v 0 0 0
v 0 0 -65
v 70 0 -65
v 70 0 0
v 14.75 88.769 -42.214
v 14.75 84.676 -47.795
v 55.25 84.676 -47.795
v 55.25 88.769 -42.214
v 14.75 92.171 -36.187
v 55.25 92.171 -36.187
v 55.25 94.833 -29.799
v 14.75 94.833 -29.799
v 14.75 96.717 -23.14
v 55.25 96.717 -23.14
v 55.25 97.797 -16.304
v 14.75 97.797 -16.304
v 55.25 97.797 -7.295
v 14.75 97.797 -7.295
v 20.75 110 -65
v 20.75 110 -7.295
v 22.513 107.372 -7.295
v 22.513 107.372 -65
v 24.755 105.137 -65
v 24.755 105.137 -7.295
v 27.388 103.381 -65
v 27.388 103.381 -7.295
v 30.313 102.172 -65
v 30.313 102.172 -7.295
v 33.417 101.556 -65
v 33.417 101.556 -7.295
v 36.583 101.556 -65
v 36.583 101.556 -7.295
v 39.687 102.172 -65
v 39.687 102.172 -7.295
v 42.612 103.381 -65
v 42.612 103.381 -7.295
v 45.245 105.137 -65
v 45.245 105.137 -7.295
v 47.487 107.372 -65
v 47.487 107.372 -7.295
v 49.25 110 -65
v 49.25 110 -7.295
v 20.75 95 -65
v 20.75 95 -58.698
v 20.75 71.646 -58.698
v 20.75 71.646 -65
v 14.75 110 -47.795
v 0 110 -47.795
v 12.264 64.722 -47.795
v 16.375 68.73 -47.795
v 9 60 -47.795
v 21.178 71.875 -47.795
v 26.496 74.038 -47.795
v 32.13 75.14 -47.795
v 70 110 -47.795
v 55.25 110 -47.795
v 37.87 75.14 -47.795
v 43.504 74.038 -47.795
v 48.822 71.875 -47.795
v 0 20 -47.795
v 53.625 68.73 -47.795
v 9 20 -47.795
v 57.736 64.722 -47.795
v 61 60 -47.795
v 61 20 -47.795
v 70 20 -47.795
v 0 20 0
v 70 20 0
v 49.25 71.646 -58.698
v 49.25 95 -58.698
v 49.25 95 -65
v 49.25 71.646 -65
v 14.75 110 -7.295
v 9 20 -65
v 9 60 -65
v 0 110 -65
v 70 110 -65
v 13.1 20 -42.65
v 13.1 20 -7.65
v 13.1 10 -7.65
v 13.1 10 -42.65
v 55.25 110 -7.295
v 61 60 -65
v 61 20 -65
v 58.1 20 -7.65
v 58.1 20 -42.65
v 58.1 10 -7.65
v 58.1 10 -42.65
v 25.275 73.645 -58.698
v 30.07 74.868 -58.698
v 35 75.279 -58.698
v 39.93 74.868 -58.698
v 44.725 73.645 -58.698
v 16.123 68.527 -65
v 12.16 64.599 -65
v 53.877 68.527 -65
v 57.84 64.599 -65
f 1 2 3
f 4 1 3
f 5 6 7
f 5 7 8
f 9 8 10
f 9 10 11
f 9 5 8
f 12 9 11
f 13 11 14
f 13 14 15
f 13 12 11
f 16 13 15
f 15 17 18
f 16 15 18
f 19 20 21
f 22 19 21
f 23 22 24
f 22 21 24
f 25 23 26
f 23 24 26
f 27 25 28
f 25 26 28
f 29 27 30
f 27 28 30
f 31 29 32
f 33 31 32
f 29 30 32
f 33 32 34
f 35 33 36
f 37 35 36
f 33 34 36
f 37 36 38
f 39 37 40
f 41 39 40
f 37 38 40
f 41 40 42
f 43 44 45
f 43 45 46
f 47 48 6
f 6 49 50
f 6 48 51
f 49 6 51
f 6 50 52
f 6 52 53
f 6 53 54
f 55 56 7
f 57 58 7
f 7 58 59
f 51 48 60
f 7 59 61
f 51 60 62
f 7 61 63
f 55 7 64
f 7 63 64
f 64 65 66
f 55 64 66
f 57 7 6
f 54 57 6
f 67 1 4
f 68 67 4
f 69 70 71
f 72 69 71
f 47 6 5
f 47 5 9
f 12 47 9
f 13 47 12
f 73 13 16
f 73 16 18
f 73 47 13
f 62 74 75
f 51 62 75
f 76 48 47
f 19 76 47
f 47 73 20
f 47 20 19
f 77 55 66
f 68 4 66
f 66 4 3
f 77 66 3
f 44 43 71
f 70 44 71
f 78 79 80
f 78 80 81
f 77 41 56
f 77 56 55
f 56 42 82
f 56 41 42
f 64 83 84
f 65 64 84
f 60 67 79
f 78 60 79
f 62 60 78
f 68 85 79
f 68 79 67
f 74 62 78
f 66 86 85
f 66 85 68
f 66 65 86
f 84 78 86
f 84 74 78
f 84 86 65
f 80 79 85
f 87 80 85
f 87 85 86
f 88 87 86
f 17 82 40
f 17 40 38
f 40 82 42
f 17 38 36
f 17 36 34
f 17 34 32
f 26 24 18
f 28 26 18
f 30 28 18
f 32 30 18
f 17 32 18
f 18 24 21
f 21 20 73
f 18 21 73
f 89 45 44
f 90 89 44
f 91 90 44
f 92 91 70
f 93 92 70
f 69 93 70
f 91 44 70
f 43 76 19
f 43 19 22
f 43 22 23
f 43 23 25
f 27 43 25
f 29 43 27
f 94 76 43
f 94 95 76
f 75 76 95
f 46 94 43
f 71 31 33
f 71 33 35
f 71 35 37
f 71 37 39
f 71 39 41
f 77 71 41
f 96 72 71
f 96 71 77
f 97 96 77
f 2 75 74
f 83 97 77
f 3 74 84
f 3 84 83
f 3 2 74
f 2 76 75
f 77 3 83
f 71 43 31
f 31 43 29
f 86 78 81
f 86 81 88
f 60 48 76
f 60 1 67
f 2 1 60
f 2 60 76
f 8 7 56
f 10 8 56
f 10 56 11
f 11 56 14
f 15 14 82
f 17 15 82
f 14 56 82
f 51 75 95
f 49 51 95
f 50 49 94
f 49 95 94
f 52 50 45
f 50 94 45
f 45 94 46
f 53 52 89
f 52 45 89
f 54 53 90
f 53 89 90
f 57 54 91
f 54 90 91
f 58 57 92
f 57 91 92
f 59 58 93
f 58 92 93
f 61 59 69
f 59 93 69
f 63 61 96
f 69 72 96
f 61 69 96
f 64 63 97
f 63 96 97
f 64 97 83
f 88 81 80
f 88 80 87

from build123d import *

# Parameters (mm, degrees)
SKETCH1_W               = 70
SKETCH1_H               = 65
BOSS_EXTRUDE1_DEPTH     = 20
SKETCH2_W               = 45
SKETCH2_H               = 35
CUT_EXTRUDE1_DEPTH      = 10
SKETCH3_W               = 70
SKETCH3_H               = 17.205499322
BOSS_EXTRUDE2_DEPTH     = 75
CUT_EXTRUDE2_REACH      = 136.722
CUT_EXTRUDE3_REACH      = 136.722
CUT_EXTRUDE3_END_RADIUS = 29.761393769
SKETCH7_W               = 28.5
SKETCH7_H               = 6.302488938
SKETCH8_W               = 70
SKETCH8_H               = 17.205499322
BOSS_EXTRUDE3_DEPTH     = 15
CUT_EXTRUDE4_DEPTH      = 146.688022843
CUT_EXTRUDE4_DEPTH_BACK = 146.688022843
BOSS_EXTRUDE8_START     = 40.5
BOSS_EXTRUDE8_DEPTH     = 40.5
BOSS_EXTRUDE10_DEPTH    = 40.5


with BuildPart() as part:
    # Sketch1 → Boss-Extrude1 (new body)
    with BuildSketch(Plane(origin=(0, 0, 0), x_dir=(1, 0, 0), z_dir=(0, 1, 0))):
        with Locations((35, 32.5)):
            Rectangle(SKETCH1_W, SKETCH1_H)
    extrude(amount=BOSS_EXTRUDE1_DEPTH)

    # Sketch2 → Cut-Extrude1 (cut)
    with BuildSketch(Plane(origin=(0, 20, 0), x_dir=(1, 0, 0), z_dir=(0, 1, 0))):
        with Locations((35.6, 25.150369075)):
            Rectangle(SKETCH2_W, SKETCH2_H)
    extrude(amount=-CUT_EXTRUDE1_DEPTH, mode=Mode.SUBTRACT)

    # Sketch3 → Boss-Extrude2 (add)
    with BuildSketch(Plane(origin=(0, 20, 0), x_dir=(1, 0, 0), z_dir=(0, 1, 0))):
        with Locations((35, 56.397250339)):
            Rectangle(SKETCH3_W, SKETCH3_H)
    extrude(amount=BOSS_EXTRUDE2_DEPTH)

    # Sketch6 → Cut-Extrude2 (cut, up to next)
    with BuildSketch(Plane(origin=(0, 0, -65), x_dir=(-1, 0, 0), z_dir=(0, 0, -1)), mode=Mode.PRIVATE) as cut_extrude2_sk1:
        with BuildLine():
            Line((-61, 60), (-61, 20))
            Line((-61, 20), (-9, 20))
            Line((-9, 20), (-9, 60))
            ThreePointArc((-9, 60), (-35, 75.278971352), (-61, 60))
        make_face()
    cut_extrude2_tool1 = extrude(cut_extrude2_sk1.sketch, amount=-CUT_EXTRUDE2_REACH, mode=Mode.PRIVATE) & part.part
    add(cut_extrude2_tool1.solids().sort_by_distance((35, 45.608619, -65))[0], mode=Mode.SUBTRACT)

    # Cut-Extrude3: up to this cylinder (the profile starts outside it)
    cut_extrude3_end = Plane(origin=(35, 45.517577583, -61.848756), z_dir=(0, 0, -1)) * Cylinder(CUT_EXTRUDE3_END_RADIUS, 333.966787538, mode=Mode.PRIVATE)
    # Sketch7 → Cut-Extrude3 (cut, up to the surface)
    with BuildSketch(Plane(origin=(0, 95, 0), x_dir=(1, 0, 0), z_dir=(0, 1, 0)), mode=Mode.PRIVATE) as cut_extrude3_sk1:
        with Locations((35, 61.848755531)):
            Rectangle(SKETCH7_W, SKETCH7_H)
    cut_extrude3_tool1 = extrude(cut_extrude3_sk1.sketch, amount=-CUT_EXTRUDE3_REACH, mode=Mode.PRIVATE) - cut_extrude3_end
    add(cut_extrude3_tool1.solids().sort_by_distance((35, 95, -61.848756))[0], mode=Mode.SUBTRACT)

    # Sketch8 → Boss-Extrude3 (add)
    with BuildSketch(Plane(origin=(0, 95, 0), x_dir=(1, 0, 0), z_dir=(0, 1, 0))):
        with Locations((35, 56.397250339)):
            Rectangle(SKETCH8_W, SKETCH8_H)
    extrude(amount=BOSS_EXTRUDE3_DEPTH)

    # Sketch9 → Cut-Extrude4 (cut, two sides: drawn at the far end of the back side and taken through both)
    with BuildSketch(Plane(origin=(0, 0, -65), x_dir=(-1, 0, 0), z_dir=(0, 0, -1)).offset(-CUT_EXTRUDE4_DEPTH_BACK)):
        with BuildLine():
            Line((-168.040562266, 331.160425887), (-49.25, 110))
            ThreePointArc((-49.25, 110), (-35, 101.478526665), (-20.75, 110))
            Line((-20.75, 110), (98.040562266, 331.160425887))
            Line((98.040562266, 331.160425887), (98.040562266, 833.248592098))
            Line((98.040562266, 833.248592098), (-168.040562266, 833.248592098))
            Line((-168.040562266, 833.248592098), (-168.040562266, 331.160425887))
        make_face()
    extrude(amount=CUT_EXTRUDE4_DEPTH + CUT_EXTRUDE4_DEPTH_BACK, mode=Mode.SUBTRACT)

    # Sketch10 → Boss-Extrude8 (add)
    with BuildSketch(Plane.XY.offset(-47.794500678).offset(BOSS_EXTRUDE8_START)):
        with BuildLine():
            Line((49.25, 110), (55.25, 110))
            Line((55.25, 110), (55.25, 97.797353367))
            Line((55.25, 97.797353367), (20.533128671, 97.797353367))
            Line((20.533128671, 97.797353367), (14.75, 97.797353367))
            Line((14.75, 97.797353367), (14.75, 110))
            Line((14.75, 110), (20.75, 110))
            ThreePointArc((20.75, 110), (35, 101.478526665), (49.25, 110))
        make_face()
    extrude(amount=-BOSS_EXTRUDE8_DEPTH)

    # Sketch12 → Boss-Extrude10 (add)
    with BuildSketch(Plane.ZY.offset(-14.75)):
        with BuildLine():
            Line((-16.303904233, 97.797353367), (-47.794500678, 97.797353367))
            Line((-47.794500678, 97.797353367), (-47.794500678, 84.67575775))
            ThreePointArc((-47.794500678, 84.67575775), (-33.03291757, 93.597379394), (-16.303904233, 97.797353367))
        make_face()
    extrude(amount=-BOSS_EXTRUDE10_DEPTH)


solid = part.part
